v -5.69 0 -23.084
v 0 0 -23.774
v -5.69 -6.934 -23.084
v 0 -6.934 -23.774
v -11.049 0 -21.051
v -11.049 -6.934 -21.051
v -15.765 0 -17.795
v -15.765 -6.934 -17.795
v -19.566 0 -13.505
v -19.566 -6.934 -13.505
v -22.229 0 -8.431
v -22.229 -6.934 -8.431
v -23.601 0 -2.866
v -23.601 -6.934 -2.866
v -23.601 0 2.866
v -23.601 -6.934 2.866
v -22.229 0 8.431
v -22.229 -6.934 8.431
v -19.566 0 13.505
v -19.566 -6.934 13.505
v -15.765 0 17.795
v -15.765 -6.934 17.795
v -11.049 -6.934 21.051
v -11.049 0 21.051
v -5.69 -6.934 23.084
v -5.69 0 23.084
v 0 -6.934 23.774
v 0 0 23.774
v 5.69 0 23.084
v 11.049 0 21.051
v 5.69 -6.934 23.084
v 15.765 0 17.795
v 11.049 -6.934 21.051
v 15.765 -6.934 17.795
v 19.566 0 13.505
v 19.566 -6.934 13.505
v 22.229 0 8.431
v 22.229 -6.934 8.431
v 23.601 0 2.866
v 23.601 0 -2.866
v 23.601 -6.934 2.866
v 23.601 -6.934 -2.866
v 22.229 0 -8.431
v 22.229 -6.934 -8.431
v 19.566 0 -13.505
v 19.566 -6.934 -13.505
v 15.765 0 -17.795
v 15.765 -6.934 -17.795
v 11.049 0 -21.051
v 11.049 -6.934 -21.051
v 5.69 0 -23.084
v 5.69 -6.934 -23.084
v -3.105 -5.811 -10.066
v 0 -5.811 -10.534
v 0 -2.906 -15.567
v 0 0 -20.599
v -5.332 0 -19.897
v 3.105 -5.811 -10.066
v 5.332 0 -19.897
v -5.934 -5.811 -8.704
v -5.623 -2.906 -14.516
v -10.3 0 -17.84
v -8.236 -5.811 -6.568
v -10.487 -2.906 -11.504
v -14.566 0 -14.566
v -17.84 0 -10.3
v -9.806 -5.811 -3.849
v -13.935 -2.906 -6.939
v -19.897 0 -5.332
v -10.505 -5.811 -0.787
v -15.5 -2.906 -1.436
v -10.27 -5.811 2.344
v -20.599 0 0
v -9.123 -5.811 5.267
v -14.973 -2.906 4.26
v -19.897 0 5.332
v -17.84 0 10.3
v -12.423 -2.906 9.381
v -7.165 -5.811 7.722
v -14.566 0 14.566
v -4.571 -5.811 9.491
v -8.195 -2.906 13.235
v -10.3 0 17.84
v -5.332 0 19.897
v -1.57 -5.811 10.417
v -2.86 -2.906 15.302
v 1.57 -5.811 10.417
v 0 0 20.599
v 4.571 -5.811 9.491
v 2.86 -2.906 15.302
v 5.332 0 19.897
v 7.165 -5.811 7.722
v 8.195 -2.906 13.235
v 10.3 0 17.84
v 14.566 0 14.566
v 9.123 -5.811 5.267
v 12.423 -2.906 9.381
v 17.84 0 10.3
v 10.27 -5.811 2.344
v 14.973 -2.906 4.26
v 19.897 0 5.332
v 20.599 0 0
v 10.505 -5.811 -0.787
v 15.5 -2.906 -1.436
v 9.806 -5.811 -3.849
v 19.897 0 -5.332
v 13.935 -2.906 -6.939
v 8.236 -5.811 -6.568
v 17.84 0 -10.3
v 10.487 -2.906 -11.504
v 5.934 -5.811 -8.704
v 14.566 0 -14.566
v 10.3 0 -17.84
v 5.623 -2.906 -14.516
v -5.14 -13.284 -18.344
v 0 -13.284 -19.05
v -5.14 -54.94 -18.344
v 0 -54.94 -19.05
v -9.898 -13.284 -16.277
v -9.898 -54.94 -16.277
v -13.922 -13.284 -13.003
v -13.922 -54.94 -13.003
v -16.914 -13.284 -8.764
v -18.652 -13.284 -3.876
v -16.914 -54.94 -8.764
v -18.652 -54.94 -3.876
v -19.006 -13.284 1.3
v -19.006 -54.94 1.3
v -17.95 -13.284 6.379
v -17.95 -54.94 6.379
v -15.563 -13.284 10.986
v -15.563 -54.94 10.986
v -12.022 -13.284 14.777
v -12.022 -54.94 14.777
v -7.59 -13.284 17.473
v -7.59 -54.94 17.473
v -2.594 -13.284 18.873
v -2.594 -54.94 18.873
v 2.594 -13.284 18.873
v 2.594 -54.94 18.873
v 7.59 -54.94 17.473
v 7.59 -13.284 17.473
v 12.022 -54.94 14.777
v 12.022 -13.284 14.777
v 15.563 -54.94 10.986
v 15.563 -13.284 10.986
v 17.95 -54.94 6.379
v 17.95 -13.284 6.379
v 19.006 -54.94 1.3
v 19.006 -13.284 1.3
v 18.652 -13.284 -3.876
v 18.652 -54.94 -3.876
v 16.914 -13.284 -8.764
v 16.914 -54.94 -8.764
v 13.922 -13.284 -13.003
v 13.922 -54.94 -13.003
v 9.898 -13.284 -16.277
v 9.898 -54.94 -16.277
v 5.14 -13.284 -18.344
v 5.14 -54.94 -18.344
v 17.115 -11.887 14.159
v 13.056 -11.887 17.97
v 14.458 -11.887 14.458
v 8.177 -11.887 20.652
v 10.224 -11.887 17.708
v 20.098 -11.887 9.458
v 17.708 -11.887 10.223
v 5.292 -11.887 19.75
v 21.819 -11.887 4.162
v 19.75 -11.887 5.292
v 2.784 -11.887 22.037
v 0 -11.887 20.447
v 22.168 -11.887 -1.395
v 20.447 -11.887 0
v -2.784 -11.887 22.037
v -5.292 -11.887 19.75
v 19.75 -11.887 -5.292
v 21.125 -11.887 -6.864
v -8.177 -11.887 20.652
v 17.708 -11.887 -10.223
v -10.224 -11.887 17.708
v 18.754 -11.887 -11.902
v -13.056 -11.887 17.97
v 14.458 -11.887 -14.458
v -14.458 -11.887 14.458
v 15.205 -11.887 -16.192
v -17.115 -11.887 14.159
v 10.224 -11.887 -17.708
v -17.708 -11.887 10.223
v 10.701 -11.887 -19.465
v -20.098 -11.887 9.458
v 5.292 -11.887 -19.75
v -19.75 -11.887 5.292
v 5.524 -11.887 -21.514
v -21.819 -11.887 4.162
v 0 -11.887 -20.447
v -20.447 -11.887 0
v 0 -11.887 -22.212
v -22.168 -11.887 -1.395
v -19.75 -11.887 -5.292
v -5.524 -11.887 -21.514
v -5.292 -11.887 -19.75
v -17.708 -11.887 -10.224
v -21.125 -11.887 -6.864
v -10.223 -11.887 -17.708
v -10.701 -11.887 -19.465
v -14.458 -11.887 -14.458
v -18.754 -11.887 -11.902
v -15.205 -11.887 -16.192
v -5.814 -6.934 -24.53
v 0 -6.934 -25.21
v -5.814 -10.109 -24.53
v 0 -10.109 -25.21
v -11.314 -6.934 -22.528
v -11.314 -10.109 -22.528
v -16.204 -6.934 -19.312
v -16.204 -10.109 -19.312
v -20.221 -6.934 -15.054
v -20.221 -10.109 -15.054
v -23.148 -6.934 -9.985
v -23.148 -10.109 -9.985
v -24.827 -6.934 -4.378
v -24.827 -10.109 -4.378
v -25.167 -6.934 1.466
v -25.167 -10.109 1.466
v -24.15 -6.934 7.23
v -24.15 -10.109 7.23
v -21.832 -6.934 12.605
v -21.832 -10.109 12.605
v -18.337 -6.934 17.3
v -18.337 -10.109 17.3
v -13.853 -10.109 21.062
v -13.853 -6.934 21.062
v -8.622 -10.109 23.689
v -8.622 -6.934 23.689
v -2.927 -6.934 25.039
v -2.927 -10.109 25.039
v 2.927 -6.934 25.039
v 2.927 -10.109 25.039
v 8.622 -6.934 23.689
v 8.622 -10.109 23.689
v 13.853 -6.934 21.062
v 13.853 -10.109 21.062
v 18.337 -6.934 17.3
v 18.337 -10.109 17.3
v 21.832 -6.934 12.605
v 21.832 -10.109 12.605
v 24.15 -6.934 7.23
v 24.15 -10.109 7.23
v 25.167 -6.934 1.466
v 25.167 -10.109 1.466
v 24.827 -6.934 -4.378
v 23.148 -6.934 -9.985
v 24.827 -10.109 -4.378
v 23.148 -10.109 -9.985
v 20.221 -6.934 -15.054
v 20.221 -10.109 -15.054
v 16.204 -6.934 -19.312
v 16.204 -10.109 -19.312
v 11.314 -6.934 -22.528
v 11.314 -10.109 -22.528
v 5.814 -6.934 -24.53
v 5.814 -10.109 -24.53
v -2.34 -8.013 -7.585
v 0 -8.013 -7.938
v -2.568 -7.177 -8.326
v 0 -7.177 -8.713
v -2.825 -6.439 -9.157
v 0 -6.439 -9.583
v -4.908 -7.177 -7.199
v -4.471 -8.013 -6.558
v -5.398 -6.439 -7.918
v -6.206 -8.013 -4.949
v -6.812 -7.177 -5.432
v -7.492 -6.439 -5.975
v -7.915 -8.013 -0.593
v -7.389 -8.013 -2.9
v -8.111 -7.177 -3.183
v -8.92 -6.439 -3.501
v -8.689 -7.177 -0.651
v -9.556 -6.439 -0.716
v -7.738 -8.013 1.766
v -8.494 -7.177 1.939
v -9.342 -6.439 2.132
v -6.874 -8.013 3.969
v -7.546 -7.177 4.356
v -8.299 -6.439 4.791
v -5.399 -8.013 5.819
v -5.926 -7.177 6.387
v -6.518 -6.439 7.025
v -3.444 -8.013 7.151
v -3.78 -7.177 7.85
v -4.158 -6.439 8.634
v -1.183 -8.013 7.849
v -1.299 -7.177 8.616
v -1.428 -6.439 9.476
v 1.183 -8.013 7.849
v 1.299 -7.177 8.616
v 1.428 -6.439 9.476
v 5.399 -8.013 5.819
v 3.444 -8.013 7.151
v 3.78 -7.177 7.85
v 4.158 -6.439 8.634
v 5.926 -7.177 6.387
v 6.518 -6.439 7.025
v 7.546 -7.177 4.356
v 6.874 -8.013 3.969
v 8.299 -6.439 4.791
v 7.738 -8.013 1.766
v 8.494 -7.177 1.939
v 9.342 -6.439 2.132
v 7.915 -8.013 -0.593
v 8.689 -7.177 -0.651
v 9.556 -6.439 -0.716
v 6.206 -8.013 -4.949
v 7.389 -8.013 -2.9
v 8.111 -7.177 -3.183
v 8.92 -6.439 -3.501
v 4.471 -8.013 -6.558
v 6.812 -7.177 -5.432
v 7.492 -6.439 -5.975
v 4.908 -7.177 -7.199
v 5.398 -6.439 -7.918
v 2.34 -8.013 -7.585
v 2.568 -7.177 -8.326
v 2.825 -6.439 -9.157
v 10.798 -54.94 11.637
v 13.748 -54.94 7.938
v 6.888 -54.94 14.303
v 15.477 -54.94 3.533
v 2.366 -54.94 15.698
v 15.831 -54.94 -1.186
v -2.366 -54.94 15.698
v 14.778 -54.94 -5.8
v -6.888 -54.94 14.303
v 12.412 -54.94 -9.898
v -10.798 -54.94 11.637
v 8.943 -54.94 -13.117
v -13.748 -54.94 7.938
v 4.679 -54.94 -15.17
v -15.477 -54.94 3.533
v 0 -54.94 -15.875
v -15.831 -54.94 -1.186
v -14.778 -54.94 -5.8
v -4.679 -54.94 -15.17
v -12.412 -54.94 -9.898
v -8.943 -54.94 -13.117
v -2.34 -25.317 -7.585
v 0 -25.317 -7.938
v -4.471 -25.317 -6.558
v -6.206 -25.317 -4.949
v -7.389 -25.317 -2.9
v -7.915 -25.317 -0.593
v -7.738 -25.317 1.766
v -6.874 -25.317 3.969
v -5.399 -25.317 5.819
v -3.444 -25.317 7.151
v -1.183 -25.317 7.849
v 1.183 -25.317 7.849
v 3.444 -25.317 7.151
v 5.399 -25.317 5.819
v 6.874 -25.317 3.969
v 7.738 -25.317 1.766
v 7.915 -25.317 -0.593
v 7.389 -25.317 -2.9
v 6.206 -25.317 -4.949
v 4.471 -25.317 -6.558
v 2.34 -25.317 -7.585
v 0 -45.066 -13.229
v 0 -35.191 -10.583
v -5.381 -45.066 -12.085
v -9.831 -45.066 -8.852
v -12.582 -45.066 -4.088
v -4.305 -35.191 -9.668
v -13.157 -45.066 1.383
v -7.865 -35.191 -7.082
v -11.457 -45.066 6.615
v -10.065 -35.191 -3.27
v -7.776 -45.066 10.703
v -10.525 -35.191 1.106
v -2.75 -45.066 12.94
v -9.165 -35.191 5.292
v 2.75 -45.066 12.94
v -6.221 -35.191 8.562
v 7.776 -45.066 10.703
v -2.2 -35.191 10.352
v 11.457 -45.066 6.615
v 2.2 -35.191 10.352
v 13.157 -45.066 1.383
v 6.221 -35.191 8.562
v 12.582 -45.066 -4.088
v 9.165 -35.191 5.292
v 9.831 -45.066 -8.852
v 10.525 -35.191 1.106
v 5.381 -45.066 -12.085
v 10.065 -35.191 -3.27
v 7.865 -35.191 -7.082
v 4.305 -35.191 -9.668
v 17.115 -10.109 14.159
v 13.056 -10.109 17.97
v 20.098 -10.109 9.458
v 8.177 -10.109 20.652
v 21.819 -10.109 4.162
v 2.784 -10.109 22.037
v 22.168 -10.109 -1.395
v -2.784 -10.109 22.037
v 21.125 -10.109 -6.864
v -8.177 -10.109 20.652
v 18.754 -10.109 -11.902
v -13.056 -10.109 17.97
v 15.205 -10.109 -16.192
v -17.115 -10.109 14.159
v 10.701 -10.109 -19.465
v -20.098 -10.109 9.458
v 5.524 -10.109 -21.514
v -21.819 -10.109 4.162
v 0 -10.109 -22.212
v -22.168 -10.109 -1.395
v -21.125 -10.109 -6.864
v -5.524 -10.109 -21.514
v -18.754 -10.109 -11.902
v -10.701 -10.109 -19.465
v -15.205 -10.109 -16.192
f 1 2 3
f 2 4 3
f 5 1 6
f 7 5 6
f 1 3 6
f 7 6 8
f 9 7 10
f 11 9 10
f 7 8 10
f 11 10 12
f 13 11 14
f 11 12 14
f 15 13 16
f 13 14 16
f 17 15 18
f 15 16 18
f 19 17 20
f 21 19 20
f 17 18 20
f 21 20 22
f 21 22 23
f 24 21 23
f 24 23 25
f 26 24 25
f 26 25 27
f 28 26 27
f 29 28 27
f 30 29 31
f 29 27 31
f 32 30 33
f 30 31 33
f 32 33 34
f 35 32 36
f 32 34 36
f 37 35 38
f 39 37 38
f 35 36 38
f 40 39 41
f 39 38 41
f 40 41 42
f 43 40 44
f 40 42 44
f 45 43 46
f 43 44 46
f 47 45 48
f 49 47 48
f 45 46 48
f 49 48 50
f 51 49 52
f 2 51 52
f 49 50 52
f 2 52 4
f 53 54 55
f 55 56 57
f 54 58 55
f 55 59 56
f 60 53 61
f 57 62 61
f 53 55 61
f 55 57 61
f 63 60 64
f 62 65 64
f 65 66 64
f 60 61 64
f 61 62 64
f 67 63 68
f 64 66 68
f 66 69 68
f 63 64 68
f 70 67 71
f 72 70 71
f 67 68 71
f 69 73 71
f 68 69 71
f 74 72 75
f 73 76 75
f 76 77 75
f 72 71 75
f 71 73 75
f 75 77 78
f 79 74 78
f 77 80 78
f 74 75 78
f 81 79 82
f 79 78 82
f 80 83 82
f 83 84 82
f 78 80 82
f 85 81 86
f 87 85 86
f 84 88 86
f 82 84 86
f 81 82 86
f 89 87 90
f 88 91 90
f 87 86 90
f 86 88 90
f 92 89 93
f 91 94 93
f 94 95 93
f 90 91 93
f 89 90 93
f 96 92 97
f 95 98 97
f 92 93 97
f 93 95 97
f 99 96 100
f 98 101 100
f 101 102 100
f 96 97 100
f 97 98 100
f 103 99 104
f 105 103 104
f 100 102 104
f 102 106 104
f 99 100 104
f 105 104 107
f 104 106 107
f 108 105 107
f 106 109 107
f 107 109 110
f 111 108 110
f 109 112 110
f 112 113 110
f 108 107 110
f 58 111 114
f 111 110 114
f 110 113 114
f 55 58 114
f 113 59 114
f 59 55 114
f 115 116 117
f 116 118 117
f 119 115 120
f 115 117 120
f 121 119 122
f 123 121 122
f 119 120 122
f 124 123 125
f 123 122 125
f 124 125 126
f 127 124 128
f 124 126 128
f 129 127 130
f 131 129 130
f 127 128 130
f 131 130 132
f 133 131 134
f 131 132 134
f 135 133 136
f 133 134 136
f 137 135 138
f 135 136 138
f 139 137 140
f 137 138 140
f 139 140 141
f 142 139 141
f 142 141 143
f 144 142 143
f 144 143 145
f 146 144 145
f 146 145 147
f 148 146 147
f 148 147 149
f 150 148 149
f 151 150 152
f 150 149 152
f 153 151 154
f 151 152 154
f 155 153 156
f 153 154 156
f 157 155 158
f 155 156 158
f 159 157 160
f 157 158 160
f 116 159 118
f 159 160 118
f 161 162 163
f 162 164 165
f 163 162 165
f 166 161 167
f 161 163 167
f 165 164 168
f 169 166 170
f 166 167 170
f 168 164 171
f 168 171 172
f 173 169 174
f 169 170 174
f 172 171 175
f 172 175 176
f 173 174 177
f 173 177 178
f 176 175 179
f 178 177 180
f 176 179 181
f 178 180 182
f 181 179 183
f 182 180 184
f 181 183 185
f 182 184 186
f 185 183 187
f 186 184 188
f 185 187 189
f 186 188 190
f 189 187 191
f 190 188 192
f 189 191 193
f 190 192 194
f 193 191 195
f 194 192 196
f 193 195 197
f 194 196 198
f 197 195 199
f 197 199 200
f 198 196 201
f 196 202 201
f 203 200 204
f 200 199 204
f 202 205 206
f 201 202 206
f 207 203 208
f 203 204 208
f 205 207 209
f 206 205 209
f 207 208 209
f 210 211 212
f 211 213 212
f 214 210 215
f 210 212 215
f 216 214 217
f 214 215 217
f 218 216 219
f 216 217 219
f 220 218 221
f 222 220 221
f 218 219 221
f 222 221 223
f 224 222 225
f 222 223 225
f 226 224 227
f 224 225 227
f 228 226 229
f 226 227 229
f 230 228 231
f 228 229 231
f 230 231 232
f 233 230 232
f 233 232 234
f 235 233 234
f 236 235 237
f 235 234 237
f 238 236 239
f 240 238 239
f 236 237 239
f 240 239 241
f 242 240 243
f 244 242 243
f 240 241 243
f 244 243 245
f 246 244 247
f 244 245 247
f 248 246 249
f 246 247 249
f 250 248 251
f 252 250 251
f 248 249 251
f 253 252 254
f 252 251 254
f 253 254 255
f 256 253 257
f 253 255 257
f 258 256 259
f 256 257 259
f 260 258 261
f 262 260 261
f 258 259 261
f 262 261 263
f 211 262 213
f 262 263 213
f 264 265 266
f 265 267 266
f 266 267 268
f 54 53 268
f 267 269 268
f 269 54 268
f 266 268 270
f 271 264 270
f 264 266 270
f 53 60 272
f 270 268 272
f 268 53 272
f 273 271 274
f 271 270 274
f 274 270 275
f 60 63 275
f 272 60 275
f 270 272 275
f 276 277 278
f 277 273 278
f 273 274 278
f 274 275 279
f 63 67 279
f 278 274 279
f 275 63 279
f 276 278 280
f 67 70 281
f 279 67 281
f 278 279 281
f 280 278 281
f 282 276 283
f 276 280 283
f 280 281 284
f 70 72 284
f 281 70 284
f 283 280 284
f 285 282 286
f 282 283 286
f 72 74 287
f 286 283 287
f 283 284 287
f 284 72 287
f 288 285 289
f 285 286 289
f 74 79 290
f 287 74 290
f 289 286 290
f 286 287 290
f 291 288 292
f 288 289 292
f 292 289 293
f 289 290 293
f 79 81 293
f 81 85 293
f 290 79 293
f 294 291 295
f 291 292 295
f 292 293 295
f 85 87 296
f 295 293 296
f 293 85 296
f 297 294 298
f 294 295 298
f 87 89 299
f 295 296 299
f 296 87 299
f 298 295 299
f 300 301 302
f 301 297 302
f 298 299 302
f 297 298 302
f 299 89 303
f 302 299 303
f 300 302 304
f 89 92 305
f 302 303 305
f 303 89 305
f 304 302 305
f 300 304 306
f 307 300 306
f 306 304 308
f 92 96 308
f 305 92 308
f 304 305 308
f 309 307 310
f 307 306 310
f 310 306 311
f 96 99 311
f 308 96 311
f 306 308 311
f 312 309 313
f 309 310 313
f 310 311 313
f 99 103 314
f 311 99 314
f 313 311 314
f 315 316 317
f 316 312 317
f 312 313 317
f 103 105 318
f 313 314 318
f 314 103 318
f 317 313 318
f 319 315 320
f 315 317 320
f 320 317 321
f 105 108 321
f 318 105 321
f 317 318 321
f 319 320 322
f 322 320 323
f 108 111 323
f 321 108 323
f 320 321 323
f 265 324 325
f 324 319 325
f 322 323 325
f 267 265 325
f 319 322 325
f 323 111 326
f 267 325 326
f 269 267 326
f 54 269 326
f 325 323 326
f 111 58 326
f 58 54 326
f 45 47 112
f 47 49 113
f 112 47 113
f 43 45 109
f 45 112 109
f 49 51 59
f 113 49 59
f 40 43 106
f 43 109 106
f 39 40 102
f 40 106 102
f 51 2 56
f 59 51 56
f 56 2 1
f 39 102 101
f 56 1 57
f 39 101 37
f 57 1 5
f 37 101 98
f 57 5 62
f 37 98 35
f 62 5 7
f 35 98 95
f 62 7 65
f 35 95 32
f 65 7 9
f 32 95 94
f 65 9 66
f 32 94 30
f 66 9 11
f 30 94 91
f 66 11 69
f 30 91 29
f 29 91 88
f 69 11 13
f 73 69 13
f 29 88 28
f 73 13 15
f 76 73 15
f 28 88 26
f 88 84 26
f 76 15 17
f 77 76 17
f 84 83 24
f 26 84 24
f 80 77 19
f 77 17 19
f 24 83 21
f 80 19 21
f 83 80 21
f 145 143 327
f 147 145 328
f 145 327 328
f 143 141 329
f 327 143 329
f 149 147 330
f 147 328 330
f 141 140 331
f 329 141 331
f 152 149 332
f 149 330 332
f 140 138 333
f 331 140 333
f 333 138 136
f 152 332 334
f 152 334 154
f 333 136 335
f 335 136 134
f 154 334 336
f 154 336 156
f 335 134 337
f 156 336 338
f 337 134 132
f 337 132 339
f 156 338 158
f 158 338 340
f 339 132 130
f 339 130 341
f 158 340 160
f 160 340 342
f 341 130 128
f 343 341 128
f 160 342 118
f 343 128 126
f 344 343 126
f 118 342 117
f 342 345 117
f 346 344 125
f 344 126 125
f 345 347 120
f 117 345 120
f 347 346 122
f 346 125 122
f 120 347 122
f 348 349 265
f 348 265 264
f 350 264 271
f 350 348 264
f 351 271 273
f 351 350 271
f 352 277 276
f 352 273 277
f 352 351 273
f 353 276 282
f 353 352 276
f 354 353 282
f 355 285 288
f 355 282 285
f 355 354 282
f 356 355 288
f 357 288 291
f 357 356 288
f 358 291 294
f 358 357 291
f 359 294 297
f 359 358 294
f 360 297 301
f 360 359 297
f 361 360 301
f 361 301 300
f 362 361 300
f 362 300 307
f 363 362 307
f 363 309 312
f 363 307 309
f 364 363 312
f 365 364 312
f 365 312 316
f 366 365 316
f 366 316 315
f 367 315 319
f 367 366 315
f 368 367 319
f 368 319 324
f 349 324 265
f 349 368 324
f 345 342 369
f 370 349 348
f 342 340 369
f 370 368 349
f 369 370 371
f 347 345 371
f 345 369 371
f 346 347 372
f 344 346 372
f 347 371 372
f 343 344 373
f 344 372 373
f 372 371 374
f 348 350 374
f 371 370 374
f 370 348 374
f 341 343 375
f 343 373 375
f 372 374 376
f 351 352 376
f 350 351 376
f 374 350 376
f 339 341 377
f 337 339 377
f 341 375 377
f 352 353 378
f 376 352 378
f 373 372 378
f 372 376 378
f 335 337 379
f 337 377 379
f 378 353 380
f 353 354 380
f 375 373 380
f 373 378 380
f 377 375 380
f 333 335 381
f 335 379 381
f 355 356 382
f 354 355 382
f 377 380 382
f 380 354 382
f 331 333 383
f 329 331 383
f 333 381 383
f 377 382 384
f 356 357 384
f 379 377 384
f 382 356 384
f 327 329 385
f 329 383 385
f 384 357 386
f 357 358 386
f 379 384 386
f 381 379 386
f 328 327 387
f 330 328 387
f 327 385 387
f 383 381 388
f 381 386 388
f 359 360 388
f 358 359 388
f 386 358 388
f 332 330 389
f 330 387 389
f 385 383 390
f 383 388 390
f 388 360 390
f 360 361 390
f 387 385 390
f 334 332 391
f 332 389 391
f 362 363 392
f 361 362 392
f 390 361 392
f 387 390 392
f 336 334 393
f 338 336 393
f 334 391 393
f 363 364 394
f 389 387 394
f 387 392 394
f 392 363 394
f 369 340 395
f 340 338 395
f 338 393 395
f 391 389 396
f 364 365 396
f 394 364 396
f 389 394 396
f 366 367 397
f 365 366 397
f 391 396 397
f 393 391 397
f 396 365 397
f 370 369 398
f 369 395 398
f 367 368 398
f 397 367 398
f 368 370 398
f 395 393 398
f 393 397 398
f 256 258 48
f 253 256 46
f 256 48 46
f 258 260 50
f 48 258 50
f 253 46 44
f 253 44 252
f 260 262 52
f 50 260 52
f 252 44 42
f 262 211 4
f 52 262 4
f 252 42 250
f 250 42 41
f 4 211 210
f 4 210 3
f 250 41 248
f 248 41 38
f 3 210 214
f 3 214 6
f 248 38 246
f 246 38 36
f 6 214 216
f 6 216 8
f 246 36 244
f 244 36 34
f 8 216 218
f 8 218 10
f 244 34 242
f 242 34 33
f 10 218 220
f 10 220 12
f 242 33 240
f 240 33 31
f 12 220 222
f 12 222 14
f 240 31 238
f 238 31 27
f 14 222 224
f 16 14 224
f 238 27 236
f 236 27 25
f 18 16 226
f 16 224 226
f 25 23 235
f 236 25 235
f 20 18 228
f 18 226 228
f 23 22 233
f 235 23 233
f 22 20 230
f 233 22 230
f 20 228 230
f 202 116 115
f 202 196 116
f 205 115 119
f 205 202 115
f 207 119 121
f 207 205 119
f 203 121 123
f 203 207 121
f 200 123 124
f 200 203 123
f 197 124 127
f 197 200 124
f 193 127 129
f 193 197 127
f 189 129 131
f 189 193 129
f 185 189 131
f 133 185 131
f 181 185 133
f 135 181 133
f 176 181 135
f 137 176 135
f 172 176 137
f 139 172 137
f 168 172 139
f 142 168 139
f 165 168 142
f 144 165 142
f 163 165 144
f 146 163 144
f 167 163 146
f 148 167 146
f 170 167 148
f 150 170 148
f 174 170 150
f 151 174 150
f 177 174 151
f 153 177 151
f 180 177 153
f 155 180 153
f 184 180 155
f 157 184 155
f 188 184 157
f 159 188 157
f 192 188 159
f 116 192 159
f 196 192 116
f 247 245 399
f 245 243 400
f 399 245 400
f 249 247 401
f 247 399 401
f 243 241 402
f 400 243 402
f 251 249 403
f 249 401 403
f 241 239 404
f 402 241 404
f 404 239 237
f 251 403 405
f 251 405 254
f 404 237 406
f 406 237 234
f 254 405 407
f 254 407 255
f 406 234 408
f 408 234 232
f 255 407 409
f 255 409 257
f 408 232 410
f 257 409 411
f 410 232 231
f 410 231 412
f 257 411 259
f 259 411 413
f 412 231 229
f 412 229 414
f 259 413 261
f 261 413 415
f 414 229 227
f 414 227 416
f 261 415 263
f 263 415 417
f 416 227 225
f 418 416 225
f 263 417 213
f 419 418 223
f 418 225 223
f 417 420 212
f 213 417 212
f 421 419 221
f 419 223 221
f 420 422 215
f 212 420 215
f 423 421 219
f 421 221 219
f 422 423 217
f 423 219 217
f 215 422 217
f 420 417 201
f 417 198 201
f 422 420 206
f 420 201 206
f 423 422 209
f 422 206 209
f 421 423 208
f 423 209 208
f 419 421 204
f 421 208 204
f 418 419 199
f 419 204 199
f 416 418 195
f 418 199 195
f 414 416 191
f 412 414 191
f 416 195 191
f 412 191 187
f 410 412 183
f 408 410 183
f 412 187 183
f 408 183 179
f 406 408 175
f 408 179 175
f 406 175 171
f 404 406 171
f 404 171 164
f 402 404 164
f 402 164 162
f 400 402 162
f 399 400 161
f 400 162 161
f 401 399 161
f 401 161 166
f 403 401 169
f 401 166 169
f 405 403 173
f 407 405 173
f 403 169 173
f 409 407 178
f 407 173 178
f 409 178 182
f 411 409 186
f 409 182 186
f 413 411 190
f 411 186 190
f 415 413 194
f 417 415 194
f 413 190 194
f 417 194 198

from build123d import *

# Parameters (mm, degrees)
CUT_EXTRUDE1_DEPTH      = 66.493994813
CUT_EXTRUDE1_DEPTH_BACK = 66.493994813
SKETCH2_R               = 7.9375


with BuildPart() as part:
    # Sketch1 → Revolve1 (revolve)
    with BuildSketch(Plane.XY, mode=Mode.PRIVATE) as revolve1_sk:
        Polygon((19.05, -11.8872), (19.05, -13.2842), (20.447, -11.8872), align=None)
        with BuildLine():
            ThreePointArc((5.771901147, -14.059921768), (7.048009176, -9.297421768), (10.534401147, -5.811029797))
            Line((10.534401147, -5.811029797), (20.5994, 0))
            Line((20.5994, 0), (23.7744, 0))
            Line((23.7744, 0), (23.7744, -6.9342))
            Line((23.7744, -6.9342), (25.2095, -6.9342))
            Line((25.2095, -6.9342), (25.2095, -10.1092))
            Line((25.2095, -10.1092), (22.2123, -10.1092))
            Line((22.2123, -10.1092), (22.2123, -11.8872))
            Line((22.2123, -11.8872), (19.05, -11.8872))
            Line((19.05, -11.8872), (19.05, -54.9402))
            Line((19.05, -54.9402), (15.875, -54.9402))
            Line((15.875, -54.9402), (5.771901147, -17.234921768))
            Line((5.771901147, -17.234921768), (5.771901147, -14.059921768))
        make_face()
    revolve(revolve1_sk.sketch.rotate(Axis((0, 0, 0), (0, 1, 0)), 90), axis=Axis((0, 0, 0), (0, 1, 0)))

    # Sketch2 → Cut-Extrude1 (cut, two sides: drawn at the far end of the back side and taken through both)
    with BuildSketch(Plane(origin=(0, 0, 0), x_dir=(1, 0, 0), z_dir=(0, 1, 0)).offset(-CUT_EXTRUDE1_DEPTH_BACK)):
        with Locations(Location((0, 0, 0), (0, 0, 90))):
            Circle(SKETCH2_R)
    extrude(amount=CUT_EXTRUDE1_DEPTH + CUT_EXTRUDE1_DEPTH_BACK, mode=Mode.SUBTRACT)


solid = part.part
